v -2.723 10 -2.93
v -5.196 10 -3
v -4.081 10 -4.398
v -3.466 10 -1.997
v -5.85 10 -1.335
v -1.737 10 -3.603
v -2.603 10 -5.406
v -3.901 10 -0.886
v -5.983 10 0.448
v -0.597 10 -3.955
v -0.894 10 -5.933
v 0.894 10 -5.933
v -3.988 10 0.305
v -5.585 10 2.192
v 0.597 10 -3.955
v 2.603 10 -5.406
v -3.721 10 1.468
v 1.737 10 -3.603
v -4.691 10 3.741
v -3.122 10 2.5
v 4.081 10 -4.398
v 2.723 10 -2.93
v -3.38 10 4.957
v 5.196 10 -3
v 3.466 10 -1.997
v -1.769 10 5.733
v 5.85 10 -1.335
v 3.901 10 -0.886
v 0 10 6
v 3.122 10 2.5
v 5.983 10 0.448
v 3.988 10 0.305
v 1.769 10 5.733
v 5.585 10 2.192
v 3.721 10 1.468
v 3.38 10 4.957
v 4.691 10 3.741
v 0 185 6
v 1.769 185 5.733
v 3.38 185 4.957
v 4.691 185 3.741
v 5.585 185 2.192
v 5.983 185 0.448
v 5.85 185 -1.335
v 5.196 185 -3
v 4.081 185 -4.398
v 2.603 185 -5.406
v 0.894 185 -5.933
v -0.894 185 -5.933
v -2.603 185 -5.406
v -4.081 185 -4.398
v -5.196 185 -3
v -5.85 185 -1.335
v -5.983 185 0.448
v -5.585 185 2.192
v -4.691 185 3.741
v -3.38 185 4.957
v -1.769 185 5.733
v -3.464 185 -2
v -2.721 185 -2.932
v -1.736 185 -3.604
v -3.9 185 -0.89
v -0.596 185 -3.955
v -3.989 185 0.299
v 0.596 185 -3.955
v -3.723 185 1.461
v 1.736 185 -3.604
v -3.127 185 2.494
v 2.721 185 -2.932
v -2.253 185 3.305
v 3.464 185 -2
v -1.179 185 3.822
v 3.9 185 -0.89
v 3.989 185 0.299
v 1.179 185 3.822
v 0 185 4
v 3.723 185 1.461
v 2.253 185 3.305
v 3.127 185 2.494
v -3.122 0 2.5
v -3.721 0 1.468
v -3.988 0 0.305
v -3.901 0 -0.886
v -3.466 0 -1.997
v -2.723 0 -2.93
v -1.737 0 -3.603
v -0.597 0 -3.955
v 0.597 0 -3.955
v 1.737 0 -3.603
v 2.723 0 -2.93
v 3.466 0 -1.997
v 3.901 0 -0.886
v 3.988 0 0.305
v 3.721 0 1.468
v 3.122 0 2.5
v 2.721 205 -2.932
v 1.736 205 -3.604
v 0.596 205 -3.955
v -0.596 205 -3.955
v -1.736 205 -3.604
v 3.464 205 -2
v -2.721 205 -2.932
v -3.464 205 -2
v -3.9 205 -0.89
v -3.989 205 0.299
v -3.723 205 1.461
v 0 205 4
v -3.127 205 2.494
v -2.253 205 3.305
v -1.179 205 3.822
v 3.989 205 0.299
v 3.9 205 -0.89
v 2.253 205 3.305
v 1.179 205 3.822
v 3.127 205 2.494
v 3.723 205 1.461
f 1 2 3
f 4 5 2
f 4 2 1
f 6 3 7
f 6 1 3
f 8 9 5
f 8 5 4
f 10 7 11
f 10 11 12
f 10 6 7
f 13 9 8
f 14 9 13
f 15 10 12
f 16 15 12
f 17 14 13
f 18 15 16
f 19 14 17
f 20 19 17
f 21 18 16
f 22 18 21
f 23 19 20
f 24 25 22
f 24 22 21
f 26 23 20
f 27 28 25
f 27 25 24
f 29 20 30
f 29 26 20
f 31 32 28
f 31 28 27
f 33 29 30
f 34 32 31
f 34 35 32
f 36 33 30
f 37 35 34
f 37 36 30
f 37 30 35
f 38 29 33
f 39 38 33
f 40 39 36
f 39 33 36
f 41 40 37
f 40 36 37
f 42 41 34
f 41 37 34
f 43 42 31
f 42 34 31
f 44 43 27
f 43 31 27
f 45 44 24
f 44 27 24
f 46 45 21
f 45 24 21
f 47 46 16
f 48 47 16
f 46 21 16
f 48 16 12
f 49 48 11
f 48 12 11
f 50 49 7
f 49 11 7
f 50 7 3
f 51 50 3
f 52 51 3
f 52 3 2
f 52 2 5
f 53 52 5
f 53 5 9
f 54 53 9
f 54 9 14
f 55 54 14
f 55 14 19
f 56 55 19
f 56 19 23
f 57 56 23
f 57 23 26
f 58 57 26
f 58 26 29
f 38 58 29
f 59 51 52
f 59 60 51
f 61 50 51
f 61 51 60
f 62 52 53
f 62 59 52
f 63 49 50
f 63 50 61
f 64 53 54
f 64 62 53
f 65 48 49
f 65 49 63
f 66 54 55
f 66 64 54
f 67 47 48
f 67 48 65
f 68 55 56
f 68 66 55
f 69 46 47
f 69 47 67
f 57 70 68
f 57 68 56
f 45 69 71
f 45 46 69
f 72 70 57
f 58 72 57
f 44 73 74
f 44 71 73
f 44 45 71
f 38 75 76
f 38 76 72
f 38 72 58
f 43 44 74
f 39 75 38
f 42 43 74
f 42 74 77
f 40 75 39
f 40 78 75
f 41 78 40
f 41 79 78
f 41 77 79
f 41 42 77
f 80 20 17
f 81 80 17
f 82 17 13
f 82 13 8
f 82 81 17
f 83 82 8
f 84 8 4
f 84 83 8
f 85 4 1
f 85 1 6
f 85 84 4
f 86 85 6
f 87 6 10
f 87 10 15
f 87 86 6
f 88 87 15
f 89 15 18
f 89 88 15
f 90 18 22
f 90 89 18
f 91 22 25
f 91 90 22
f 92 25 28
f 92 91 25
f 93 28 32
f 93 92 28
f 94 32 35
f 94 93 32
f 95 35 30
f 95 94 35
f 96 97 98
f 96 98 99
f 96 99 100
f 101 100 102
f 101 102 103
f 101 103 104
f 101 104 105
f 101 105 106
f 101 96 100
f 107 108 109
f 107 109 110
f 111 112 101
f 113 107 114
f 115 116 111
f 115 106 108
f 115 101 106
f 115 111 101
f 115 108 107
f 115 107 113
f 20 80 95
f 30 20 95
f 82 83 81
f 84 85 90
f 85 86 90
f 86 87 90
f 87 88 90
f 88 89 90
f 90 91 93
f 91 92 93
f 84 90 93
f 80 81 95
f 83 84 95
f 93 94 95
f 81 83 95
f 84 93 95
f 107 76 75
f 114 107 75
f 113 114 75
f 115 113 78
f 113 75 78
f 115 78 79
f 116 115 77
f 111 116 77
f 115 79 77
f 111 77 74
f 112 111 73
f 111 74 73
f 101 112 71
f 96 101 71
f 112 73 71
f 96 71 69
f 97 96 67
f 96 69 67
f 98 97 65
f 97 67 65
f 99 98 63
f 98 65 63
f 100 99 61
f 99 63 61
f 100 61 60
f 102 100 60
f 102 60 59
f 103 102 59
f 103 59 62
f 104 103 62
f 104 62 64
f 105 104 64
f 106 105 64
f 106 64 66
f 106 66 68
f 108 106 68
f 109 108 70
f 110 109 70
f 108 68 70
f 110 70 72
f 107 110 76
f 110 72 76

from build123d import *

# Parameters (mm, degrees)
SKETCH_1_R          = 6
EXTRUDE_1_DEPTH     = 185
SKETCH_2_R          = 4
EXTRUDE_2_DEPTH     = 20
SKETCH_3_R          = 9.732435518
SKETCH_3_R_2        = 4
CUT_EXTRUDE_1_DEPTH = 10
CUT_EXTRUDE_2_DEPTH = 10


with BuildPart() as part:
    # Эскиз1 → Бобышка-Вытянуть1 (new body)
    with BuildSketch(Plane(origin=(0, 0, 0), x_dir=(1, 0, 0), z_dir=(0, 1, 0))):
        with Locations(Location((0, 0, 0), (0, 0, 270))):
            Circle(SKETCH_1_R)
    extrude(amount=EXTRUDE_1_DEPTH)

    # Эскиз2 → Бобышка-Вытянуть2 (add)
    with BuildSketch(Plane(origin=(0, 185, 0), x_dir=(1, 0, 0), z_dir=(0, 1, 0))):
        with Locations(Location((0, 0, 0), (0, 0, 270))):
            Circle(SKETCH_2_R)
    extrude(amount=EXTRUDE_2_DEPTH)

    # Эскиз3 → Вырез-Вытянуть1 (cut)
    with BuildSketch(Plane.XZ):
        Circle(SKETCH_3_R)
        with Locations(Location((0, 0, 0), (0, 0, 90))):
            Circle(SKETCH_3_R_2, mode=Mode.SUBTRACT)
    extrude(amount=-CUT_EXTRUDE_1_DEPTH, mode=Mode.SUBTRACT)

    # Эскиз4 → Вырез-Вытянуть2 (cut)
    with BuildSketch(Plane.XZ):
        Polygon((-4.486362363, 2.5), (4.2655411, 2.5), (0, 5.300115958), align=None)
    extrude(amount=-CUT_EXTRUDE_2_DEPTH, mode=Mode.SUBTRACT)


solid = part.part
